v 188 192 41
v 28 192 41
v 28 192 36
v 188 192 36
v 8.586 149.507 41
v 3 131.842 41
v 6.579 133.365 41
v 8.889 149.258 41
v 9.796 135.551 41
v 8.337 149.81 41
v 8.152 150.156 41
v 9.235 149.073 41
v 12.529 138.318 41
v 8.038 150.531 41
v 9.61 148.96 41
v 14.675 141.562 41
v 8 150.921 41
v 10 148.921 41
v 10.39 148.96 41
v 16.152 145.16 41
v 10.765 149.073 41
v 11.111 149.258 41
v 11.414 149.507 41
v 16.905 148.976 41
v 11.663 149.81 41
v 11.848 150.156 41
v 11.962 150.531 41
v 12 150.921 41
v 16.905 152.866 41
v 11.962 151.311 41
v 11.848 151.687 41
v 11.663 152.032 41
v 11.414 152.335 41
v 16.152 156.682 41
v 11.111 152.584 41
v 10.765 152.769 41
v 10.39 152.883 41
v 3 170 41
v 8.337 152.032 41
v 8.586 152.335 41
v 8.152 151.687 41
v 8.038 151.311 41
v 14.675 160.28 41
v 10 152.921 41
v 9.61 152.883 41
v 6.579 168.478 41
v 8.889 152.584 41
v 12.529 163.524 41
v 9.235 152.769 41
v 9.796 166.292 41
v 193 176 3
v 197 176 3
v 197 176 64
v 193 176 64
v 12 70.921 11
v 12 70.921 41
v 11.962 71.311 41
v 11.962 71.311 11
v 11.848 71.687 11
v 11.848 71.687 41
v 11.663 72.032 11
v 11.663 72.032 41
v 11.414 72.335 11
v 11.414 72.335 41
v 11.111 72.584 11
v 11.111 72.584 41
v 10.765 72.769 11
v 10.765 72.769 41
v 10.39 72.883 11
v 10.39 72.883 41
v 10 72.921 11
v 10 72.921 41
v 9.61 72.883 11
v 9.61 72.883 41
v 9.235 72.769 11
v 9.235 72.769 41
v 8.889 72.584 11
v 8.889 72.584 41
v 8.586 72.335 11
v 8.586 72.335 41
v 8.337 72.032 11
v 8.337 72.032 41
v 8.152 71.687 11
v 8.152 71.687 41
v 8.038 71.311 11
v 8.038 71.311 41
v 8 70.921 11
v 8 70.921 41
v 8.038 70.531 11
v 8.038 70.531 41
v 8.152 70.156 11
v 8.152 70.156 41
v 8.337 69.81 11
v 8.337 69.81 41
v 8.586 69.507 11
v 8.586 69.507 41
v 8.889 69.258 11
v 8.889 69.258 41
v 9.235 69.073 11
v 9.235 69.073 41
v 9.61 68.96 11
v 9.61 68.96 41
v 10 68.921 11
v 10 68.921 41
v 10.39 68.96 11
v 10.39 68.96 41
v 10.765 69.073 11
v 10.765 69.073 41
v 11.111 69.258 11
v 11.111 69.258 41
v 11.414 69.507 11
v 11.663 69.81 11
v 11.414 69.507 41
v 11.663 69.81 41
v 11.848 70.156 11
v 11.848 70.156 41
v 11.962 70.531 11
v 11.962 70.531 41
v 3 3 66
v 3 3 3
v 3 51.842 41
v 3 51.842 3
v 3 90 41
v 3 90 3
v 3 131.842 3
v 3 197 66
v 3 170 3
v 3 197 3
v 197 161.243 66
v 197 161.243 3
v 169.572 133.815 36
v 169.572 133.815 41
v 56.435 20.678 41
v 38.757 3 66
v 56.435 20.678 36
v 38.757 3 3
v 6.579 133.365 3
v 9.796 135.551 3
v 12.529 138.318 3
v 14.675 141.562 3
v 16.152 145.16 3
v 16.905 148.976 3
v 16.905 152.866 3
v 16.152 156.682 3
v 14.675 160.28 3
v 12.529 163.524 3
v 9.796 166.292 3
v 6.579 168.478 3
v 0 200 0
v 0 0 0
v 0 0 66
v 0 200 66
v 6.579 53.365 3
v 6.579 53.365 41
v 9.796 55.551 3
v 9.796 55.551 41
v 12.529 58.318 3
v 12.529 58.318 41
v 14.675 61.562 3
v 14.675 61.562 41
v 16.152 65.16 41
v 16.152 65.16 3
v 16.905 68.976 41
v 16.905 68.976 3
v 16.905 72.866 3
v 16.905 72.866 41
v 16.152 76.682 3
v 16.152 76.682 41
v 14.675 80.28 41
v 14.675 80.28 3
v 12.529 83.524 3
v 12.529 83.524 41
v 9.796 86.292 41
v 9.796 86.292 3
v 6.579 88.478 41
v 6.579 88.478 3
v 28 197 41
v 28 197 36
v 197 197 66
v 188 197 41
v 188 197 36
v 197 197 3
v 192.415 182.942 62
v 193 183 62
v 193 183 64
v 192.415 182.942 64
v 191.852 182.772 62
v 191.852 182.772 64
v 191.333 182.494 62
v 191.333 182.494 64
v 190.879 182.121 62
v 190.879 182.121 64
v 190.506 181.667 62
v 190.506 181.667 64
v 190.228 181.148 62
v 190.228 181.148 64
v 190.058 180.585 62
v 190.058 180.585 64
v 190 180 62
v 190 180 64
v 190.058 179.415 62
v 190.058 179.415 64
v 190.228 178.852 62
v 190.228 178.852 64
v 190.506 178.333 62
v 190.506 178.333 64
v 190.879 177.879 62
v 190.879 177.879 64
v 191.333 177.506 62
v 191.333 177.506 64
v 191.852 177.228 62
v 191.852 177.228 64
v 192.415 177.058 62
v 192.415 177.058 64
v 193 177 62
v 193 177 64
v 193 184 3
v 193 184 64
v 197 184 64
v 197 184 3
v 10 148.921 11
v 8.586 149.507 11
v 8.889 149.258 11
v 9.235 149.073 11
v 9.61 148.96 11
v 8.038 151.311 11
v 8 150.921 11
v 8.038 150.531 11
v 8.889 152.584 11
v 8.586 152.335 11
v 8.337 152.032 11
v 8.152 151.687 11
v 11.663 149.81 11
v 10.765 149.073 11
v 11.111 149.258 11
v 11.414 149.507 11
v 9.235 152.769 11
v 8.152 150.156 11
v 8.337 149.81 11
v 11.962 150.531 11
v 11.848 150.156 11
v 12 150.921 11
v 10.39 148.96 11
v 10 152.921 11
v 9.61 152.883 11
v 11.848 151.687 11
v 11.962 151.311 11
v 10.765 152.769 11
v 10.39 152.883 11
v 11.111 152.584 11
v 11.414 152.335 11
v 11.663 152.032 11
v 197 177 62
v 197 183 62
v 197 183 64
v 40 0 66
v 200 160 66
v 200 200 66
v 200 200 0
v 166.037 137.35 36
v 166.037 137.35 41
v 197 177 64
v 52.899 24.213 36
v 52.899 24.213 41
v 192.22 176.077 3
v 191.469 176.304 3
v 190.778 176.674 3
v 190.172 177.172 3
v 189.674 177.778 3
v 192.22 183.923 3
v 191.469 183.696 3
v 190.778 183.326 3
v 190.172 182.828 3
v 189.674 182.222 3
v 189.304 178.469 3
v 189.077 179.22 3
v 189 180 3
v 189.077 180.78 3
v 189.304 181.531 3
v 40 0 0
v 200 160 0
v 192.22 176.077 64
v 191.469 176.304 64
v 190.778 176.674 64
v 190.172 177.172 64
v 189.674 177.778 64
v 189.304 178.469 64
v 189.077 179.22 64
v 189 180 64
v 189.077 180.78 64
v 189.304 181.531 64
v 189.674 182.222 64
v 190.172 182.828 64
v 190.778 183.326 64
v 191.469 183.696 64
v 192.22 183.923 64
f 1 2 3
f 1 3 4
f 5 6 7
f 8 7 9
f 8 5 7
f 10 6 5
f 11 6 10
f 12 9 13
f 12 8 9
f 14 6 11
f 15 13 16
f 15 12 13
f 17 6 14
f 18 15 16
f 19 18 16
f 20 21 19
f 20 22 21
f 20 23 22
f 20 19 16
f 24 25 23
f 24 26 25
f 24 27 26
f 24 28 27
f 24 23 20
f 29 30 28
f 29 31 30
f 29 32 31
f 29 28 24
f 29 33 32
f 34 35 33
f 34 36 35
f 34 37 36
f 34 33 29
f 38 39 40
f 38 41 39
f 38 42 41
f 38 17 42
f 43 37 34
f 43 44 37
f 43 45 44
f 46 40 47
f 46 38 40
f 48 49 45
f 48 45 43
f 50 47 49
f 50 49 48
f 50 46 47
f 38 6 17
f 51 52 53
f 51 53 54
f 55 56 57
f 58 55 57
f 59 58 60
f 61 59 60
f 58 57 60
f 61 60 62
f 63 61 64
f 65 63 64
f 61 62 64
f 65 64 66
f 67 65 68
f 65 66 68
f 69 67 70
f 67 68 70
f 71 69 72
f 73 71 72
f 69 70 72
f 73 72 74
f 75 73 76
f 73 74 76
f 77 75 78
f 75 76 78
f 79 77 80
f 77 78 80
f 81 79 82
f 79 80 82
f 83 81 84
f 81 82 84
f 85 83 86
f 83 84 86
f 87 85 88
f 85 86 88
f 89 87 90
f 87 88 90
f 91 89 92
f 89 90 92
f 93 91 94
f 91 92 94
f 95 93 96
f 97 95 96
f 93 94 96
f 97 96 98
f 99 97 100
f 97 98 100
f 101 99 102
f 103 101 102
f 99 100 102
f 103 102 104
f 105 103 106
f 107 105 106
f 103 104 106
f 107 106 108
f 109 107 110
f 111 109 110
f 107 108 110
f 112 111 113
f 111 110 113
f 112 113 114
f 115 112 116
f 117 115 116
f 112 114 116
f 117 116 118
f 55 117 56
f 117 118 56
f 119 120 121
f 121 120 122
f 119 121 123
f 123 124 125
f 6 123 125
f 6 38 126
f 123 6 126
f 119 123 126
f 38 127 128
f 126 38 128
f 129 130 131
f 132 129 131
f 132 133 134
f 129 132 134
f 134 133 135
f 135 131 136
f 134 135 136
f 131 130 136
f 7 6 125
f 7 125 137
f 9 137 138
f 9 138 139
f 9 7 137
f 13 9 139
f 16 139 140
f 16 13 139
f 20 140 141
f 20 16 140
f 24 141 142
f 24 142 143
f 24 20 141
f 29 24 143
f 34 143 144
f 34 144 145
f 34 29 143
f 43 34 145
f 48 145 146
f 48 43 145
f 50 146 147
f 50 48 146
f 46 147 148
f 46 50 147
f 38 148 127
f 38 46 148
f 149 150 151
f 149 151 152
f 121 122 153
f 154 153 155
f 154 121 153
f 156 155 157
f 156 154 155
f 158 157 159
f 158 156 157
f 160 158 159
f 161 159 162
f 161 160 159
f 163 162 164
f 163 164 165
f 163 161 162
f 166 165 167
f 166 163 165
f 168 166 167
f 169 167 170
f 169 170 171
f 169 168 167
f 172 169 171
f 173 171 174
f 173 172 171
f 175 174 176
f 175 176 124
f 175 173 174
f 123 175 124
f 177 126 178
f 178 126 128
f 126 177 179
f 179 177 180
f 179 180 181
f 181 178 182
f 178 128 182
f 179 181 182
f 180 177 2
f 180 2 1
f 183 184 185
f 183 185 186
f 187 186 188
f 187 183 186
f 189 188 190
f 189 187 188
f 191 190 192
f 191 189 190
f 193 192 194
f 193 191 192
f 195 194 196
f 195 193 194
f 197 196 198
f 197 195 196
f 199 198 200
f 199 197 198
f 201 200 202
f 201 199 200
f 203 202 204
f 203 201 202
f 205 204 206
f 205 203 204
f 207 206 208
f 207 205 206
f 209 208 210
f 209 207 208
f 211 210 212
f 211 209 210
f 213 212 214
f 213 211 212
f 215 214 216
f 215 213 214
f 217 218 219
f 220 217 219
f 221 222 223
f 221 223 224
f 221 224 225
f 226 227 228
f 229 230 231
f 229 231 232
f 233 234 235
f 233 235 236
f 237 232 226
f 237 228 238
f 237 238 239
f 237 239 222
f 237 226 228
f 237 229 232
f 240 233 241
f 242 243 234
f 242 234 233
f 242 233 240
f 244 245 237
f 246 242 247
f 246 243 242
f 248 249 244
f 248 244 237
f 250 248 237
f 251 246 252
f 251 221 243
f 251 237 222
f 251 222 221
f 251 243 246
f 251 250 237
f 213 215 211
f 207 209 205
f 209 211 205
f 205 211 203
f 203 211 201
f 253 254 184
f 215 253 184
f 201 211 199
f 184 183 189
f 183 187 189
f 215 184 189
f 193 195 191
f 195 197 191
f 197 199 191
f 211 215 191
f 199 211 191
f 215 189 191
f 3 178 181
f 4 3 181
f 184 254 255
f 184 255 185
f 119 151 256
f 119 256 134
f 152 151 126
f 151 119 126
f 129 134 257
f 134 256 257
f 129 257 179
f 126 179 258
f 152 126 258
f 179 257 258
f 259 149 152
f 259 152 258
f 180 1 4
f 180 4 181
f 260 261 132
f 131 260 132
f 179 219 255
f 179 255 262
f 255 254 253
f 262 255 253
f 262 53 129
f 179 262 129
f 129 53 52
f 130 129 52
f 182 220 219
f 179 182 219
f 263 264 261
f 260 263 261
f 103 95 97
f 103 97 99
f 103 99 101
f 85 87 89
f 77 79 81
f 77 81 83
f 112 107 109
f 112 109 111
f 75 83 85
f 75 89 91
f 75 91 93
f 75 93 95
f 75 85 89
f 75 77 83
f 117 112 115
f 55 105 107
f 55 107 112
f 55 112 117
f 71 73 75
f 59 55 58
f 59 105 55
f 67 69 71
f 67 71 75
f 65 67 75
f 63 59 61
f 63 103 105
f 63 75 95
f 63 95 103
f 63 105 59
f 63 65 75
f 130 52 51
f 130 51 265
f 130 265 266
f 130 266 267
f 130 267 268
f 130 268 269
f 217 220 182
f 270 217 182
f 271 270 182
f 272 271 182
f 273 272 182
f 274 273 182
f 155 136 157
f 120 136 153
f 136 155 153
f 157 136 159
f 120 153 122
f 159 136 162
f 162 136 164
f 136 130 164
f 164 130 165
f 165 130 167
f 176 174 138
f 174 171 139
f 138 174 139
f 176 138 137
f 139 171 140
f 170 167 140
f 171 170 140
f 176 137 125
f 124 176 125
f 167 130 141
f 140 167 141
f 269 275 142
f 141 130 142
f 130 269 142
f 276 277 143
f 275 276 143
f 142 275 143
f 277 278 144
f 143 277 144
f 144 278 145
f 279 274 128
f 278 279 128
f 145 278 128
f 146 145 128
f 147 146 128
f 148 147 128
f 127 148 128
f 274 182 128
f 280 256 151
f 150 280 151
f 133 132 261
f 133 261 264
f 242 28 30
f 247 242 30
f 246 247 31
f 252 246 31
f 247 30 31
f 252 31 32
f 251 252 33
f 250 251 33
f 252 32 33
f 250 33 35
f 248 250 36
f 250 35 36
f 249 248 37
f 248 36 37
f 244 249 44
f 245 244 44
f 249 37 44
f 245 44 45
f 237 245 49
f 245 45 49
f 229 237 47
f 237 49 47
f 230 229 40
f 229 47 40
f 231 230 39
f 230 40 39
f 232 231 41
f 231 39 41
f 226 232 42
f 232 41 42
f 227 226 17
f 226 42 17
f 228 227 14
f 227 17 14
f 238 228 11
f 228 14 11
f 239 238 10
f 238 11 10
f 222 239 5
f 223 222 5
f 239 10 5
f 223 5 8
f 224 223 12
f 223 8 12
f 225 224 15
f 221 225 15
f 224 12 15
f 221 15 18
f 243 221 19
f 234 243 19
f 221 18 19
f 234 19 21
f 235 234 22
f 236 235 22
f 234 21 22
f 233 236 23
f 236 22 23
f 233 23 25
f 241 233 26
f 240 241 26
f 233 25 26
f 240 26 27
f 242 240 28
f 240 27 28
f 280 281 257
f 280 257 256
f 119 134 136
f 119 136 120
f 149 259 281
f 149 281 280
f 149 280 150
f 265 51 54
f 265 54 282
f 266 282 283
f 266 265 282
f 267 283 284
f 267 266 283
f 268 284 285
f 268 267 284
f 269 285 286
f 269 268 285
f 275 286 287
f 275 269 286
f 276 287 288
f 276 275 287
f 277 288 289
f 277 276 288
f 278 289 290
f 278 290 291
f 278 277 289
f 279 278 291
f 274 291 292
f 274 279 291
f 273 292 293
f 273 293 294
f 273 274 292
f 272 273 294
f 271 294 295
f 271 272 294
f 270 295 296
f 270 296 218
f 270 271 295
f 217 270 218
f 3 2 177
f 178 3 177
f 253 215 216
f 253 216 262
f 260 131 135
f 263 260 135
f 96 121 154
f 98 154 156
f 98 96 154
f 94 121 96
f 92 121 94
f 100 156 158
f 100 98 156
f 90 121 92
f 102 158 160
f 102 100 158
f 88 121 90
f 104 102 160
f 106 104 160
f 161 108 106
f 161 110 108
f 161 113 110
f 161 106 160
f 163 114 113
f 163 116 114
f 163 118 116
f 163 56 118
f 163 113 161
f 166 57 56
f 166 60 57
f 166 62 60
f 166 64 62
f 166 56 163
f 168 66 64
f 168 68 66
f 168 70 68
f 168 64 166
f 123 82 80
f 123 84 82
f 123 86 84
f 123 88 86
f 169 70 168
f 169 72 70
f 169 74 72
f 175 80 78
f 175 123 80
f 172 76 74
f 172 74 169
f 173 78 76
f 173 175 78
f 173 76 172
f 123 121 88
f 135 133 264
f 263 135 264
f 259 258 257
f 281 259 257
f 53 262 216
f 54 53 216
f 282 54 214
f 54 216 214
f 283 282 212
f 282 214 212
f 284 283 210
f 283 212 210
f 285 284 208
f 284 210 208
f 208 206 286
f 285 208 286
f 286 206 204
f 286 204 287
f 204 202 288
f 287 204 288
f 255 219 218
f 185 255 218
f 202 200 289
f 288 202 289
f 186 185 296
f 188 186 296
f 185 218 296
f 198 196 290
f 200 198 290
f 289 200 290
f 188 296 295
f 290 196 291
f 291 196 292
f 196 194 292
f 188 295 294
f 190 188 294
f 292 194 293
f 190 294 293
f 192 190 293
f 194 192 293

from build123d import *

# Parameters (mm, degrees)
ESTRUSIONE_ESTRUSIONE1_DEPTH  = 70
SVUOTA1_T                     = -3
SCHIZZO5_W                    = 4
SCHIZZO5_H                    = 200
TAGLIO_ESTRUSIONE1_DEPTH      = 1
TAGLIO_ESTRUSIONE1_DEPTH_BACK = 201
ESTRUSIONE_ESTRUSIONE4_DEPTH  = 38
SCHIZZO8_R                    = 2
TAGLIO_ESTRUSIONE2_DEPTH      = 30
SCHIZZO11_W                   = 160
SCHIZZO11_H                   = 5
ESTRUSIONE_ESTRUSIONE7_DEPTH  = 5
ESTRUSIONE_ESTRUSIONE8_DEPTH  = 62
ESTRUSIONE_ESTRUSIONE9_DEPTH  = 2


with BuildPart() as part:
    # Schizzo2 → Estrusione-Estrusione1 (new body)
    with BuildSketch(Plane.XY):
        Polygon((0, 0), (0, 200), (200, 200), (200, 160), (40, 0), align=None)
    extrude(amount=ESTRUSIONE_ESTRUSIONE1_DEPTH)

    # Svuota1
    svuota1_openings = [part.faces().sort_by_distance(p)[0] for p in [
        (88, 112, 70),
    ]]
    offset(amount=SVUOTA1_T, openings=svuota1_openings, kind=Kind.INTERSECTION)

    # Schizzo5 → Taglio-Estrusione1 (cut, two sides)
    with BuildSketch(Plane(origin=(200, 0, 0), x_dir=(0, 0, -1), z_dir=(1, 0, 0))) as taglio_estrusione1_sk:
        with Locations((-68, 100)):
            Rectangle(SCHIZZO5_W, SCHIZZO5_H)
    extrude(amount=TAGLIO_ESTRUSIONE1_DEPTH, mode=Mode.SUBTRACT)
    extrude(taglio_estrusione1_sk.sketch, amount=-TAGLIO_ESTRUSIONE1_DEPTH_BACK, mode=Mode.SUBTRACT)

    # Schizzo7 → Estrusione-Estrusione4 (add)
    with BuildSketch(Plane.XY.offset(41)):
        with BuildLine():
            Line((3, 170), (3, 131.842431943))
            ThreePointArc((3, 131.842431943), (17, 150.921215972), (3, 170))
        make_face()
        with BuildLine():
            Line((3, 90), (3, 51.842431943))
            ThreePointArc((3, 51.842431943), (17, 70.921215972), (3, 90))
        make_face()
    extrude(amount=-ESTRUSIONE_ESTRUSIONE4_DEPTH)

    # Schizzo8 → Taglio-Estrusione2 (cut)
    with BuildSketch(Plane.XY.offset(41)):
        with Locations((10, 150.921215972)):
            Circle(SCHIZZO8_R)
        with Locations((10, 70.921215972)):
            Circle(SCHIZZO8_R)
    extrude(amount=-TAGLIO_ESTRUSIONE2_DEPTH, mode=Mode.SUBTRACT)

    # Schizzo11 → Estrusione-Estrusione7 (add)
    with BuildSketch(Plane.XY.offset(41)):
        with Locations((108, 194.5)):
            Rectangle(SCHIZZO11_W, SCHIZZO11_H)
        Polygon((169.572113832, 133.81475452), (56.435028843, 20.67766953), (52.899494937, 24.213203436), (166.036579926, 137.350288425), align=None)
    extrude(amount=-ESTRUSIONE_ESTRUSIONE7_DEPTH)

    # Schizzo12 → Estrusione-Estrusione8 (add)
    with BuildSketch(Plane.XY.offset(62)):
        with BuildLine():
            Line((193, 184), (197, 184))
            Line((197, 184), (197, 176))
            Line((197, 176), (193, 176))
            ThreePointArc((193, 176), (189, 180), (193, 184))
        make_face()
    extrude(amount=-ESTRUSIONE_ESTRUSIONE8_DEPTH)

    # Schizzo13 → Estrusione-Estrusione9 (add)
    with BuildSketch(Plane.XY.offset(62)):
        with BuildLine():
            Line((193, 177), (196, 177))
            Line((196, 177), (197, 177))
            Line((197, 177), (197, 176))
            Line((197, 176), (193, 176))
            ThreePointArc((193, 176), (189, 180), (193, 184))
            Line((193, 184), (197, 184))
            Line((197, 184), (197, 183))
            Line((197, 183), (193, 183))
            ThreePointArc((193, 183), (190, 180), (193, 177))
        make_face()
    extrude(amount=ESTRUSIONE_ESTRUSIONE9_DEPTH)


solid = part.part
